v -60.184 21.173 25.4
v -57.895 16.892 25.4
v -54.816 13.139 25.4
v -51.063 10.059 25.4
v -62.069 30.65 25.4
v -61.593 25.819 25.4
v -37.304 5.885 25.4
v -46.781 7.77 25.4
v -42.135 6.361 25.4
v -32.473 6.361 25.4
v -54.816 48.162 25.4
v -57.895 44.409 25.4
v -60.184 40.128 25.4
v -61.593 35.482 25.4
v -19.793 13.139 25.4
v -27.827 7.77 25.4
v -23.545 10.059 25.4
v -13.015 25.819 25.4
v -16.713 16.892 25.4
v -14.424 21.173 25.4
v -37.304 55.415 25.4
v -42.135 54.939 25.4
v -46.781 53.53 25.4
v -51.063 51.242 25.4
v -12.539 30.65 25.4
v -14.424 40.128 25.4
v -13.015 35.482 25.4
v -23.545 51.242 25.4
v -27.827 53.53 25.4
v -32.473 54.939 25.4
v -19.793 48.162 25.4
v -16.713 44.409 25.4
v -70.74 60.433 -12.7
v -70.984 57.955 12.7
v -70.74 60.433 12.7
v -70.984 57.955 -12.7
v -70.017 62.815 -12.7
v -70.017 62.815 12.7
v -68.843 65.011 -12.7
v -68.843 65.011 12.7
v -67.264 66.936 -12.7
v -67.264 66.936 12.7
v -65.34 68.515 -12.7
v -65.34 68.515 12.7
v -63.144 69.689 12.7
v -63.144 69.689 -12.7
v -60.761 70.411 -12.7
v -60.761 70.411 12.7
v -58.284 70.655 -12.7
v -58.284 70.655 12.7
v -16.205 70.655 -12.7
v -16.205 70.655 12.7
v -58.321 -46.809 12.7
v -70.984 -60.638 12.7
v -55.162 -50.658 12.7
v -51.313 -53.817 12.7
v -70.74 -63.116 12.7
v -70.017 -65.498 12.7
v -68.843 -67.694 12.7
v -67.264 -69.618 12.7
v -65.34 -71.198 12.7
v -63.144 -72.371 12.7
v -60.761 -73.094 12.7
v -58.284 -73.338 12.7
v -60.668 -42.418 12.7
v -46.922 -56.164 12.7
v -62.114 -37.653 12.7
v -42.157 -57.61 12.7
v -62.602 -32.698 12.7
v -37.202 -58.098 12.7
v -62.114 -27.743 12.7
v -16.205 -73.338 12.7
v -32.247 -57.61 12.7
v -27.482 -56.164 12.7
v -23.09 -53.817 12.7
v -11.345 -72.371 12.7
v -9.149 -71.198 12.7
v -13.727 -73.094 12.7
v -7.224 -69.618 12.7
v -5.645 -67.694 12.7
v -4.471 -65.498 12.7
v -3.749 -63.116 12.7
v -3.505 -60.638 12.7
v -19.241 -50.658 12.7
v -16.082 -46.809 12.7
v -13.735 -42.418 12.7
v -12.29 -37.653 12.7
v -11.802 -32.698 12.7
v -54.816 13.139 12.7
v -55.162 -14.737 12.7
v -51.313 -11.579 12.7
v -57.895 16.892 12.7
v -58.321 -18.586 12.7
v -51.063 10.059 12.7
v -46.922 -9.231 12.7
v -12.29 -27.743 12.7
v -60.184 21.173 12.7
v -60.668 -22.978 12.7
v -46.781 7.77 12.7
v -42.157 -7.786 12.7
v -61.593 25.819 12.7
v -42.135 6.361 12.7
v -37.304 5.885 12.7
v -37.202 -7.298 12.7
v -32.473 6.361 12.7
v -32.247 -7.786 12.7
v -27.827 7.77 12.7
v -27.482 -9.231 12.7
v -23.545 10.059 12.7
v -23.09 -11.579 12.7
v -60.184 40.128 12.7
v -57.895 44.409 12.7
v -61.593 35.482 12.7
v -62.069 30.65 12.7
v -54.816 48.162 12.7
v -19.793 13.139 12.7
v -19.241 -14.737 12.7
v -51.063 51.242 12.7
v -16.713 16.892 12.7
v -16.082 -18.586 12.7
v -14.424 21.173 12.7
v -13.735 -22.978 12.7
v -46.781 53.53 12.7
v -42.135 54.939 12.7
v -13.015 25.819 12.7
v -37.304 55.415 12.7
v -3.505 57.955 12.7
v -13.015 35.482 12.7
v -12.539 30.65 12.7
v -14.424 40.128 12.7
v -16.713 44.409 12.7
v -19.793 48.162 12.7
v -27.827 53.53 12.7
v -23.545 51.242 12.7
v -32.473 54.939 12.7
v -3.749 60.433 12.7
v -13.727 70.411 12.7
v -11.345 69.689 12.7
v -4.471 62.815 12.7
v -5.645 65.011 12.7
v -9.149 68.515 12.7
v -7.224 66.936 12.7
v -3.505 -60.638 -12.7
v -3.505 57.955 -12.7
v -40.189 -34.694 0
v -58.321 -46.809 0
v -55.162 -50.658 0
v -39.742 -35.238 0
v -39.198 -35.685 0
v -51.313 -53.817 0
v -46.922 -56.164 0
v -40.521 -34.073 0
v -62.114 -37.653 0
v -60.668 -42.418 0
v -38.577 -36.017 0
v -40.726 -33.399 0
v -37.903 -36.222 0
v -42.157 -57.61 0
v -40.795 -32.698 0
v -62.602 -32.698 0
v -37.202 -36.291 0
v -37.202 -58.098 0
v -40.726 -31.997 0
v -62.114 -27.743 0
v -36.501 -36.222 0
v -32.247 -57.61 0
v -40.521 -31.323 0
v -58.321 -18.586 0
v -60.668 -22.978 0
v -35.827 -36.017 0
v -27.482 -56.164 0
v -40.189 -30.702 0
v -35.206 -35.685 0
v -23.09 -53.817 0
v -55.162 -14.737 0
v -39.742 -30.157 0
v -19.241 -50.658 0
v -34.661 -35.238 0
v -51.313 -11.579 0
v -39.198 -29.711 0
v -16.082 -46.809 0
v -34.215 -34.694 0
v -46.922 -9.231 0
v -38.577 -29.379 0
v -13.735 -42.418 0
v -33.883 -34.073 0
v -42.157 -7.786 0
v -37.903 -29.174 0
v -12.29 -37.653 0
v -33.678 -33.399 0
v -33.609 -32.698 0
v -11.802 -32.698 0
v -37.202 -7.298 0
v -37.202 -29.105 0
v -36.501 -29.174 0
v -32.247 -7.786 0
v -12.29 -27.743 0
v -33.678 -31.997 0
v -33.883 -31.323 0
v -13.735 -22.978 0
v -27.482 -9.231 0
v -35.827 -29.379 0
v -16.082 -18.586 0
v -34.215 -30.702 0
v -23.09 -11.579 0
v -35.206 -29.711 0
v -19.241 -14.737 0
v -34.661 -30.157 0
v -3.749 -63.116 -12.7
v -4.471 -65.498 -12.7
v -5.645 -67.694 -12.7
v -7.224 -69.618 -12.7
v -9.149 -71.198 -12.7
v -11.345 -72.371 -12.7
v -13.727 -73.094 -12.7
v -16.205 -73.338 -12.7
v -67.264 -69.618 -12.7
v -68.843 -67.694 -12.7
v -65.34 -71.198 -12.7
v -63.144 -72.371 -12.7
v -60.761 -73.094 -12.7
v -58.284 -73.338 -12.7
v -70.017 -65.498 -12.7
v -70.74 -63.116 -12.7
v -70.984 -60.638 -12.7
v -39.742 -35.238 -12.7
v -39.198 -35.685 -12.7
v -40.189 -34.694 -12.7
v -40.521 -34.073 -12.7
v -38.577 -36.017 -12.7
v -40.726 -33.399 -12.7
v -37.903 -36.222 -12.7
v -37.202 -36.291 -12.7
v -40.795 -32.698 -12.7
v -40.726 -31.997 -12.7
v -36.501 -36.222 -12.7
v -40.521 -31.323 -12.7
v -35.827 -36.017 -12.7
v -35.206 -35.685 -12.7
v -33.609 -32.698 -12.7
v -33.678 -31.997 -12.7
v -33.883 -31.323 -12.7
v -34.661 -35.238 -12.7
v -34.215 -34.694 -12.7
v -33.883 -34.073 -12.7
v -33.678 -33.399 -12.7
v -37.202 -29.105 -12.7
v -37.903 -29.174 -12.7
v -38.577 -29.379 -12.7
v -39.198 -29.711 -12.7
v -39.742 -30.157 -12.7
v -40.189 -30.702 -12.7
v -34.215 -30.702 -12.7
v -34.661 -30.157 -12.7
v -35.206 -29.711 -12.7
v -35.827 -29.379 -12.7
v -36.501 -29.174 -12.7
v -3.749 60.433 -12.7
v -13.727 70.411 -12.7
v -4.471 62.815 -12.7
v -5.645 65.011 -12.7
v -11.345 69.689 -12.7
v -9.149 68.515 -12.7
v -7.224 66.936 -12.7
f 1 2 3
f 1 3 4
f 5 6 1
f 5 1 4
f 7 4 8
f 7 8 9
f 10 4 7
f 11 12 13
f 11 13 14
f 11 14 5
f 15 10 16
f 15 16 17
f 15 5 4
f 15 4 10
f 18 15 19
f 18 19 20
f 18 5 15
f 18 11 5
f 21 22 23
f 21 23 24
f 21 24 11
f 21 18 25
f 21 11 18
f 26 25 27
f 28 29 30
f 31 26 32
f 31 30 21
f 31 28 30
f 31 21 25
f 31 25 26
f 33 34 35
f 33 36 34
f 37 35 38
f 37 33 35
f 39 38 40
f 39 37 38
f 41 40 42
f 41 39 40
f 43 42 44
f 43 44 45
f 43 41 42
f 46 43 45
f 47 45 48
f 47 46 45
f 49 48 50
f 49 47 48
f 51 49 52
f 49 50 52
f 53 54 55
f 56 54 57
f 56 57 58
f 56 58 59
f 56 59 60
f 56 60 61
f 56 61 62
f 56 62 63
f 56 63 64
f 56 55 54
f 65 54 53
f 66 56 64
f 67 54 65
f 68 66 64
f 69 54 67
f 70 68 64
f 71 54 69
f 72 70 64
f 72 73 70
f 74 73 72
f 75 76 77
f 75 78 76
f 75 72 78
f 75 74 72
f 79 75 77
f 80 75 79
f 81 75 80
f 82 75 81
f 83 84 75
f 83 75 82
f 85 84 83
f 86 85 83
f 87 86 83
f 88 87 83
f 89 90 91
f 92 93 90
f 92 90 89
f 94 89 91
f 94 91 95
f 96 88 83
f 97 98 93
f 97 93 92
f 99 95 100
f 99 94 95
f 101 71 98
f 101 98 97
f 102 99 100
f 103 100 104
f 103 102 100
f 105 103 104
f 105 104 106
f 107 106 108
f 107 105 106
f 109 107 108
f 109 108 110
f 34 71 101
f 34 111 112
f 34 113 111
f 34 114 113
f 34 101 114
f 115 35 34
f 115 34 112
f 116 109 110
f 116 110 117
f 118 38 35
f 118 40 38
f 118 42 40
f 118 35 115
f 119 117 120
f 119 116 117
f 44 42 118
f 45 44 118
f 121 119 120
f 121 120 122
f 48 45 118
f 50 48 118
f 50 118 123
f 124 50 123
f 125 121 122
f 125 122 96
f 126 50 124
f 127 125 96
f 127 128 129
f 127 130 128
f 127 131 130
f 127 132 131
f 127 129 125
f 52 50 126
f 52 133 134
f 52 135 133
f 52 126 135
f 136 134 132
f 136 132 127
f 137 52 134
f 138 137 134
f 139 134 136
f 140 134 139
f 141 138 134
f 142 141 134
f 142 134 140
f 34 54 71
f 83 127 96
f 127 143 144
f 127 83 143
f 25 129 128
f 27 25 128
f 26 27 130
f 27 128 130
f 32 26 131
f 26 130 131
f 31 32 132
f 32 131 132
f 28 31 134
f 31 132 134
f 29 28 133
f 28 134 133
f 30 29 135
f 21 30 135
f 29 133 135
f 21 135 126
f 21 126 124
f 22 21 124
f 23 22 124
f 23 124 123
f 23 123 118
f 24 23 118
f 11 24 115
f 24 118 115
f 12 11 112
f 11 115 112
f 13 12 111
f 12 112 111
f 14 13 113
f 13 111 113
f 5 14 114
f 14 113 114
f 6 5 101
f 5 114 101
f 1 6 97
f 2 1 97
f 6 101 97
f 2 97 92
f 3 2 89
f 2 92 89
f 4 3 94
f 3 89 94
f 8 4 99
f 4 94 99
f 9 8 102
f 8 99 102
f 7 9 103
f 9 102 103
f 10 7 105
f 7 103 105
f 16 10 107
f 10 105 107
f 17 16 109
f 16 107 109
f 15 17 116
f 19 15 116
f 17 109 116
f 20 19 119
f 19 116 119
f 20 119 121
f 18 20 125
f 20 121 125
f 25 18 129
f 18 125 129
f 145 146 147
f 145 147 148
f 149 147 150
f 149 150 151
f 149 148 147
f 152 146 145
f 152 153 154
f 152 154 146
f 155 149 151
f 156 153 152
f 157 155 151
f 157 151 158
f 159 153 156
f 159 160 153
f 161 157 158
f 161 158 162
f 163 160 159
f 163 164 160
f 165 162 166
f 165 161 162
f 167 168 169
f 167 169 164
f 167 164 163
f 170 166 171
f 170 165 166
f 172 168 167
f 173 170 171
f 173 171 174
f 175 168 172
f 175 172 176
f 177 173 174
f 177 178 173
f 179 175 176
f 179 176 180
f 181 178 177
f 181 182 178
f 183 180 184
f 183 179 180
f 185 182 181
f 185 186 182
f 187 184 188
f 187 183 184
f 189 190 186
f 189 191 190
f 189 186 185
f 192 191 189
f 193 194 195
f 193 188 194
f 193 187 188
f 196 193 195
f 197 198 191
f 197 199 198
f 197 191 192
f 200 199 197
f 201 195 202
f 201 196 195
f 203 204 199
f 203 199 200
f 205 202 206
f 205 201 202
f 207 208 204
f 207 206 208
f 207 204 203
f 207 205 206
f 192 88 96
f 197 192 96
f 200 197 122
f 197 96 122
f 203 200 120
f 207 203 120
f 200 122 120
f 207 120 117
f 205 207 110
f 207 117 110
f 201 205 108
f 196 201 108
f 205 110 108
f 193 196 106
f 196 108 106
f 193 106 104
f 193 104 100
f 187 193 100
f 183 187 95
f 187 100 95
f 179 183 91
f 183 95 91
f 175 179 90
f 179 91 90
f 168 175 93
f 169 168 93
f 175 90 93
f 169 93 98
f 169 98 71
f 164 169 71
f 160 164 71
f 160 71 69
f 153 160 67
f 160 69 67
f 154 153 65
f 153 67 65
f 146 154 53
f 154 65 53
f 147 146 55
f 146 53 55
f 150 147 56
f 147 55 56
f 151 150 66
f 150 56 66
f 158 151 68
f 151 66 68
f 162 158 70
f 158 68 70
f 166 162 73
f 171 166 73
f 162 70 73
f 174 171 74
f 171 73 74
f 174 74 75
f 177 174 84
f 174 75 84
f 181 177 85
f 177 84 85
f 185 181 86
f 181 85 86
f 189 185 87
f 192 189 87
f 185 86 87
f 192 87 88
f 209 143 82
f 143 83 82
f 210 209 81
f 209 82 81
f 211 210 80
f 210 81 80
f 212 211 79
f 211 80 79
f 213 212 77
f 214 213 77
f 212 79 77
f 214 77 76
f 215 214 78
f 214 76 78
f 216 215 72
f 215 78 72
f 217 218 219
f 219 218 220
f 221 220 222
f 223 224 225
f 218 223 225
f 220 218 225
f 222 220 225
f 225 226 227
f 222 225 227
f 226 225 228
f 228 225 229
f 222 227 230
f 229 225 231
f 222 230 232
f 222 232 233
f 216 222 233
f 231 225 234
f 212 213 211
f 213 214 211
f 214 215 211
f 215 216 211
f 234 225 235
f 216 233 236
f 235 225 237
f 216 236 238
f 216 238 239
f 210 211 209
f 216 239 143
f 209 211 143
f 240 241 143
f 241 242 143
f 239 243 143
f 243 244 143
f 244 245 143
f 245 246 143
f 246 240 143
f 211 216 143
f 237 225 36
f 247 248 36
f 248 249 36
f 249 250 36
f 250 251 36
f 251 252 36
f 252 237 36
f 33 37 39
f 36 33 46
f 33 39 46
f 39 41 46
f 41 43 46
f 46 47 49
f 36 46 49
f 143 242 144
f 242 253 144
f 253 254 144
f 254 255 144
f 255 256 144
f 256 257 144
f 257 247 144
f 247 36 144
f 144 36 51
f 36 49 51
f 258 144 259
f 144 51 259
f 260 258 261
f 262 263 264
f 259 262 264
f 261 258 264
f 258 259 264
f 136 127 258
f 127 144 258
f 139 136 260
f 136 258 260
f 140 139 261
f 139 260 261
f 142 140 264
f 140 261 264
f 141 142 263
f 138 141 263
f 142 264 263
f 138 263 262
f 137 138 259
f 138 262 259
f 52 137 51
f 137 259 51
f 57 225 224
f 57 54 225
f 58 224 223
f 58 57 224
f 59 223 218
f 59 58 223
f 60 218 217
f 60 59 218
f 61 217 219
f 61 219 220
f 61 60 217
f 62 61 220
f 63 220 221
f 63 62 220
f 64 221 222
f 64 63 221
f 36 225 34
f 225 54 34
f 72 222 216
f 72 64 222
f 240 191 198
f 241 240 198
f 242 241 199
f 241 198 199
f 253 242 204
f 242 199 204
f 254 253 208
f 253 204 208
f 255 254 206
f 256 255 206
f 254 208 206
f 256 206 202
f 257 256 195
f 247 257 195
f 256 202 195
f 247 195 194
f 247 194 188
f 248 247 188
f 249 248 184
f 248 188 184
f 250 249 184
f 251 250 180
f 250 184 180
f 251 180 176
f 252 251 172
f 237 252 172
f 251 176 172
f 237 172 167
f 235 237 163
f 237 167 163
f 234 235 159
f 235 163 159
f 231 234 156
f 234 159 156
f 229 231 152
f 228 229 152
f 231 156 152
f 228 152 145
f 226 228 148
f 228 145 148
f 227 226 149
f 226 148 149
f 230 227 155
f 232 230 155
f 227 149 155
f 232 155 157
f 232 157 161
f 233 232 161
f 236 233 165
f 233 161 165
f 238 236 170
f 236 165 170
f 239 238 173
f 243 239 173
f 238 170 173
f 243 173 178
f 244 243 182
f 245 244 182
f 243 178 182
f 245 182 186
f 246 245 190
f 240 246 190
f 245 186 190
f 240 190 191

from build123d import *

# Parameters (mm, degrees)
F0_W     = 67.47918
F0_H     = 143.993221
F1_DEPTH = 12.7
F2_R     = 12.7
F3_R     = 25.4
F4_DEPTH = 12.7
F5_R     = 3.592793
F6_DEPTH = 12.7
F7_R     = 24.765
F8_DEPTH = 12.7


with BuildPart() as f1:
    # F0 (on Top) → F1 (new body, symmetric)
    with BuildSketch(Plane.XY):
        with Locations((-37.244237, -1.34131)):
            Rectangle(F0_W, F0_H)
    extrude(amount=F1_DEPTH, both=True)

    # F2
    f2_edges = [f1.edges().sort_by_distance(p)[0] for p in [
        (-70.983827, -73.33792, 0),
        (-3.504647, -73.33792, 0),
        (-3.504647, 70.655301, 0),
        (-70.983827, 70.655301, 0),
    ]]
    fillet(f2_edges, radius=F2_R)

    # F3 (on face) → F4 (cut)
    with BuildSketch(Plane.XY.offset(12.7)):
        with Locations((-37.201827, -32.69792)):
            Circle(F3_R)
    extrude(amount=-F4_DEPTH, mode=Mode.SUBTRACT)

    # F5 (on face) → F6 (cut, through all)
    with BuildSketch(Plane.XY):
        with Locations((-37.201827, -32.69792)):
            Circle(F5_R)
    extrude(amount=-F6_DEPTH, mode=Mode.SUBTRACT)

    # F7 (on face) → F8 (join)
    with BuildSketch(Plane.XY.offset(12.7)):
        with Locations((-37.304053, 30.650346)):
            Circle(F7_R)
    extrude(amount=F8_DEPTH)


solid = f1.part
